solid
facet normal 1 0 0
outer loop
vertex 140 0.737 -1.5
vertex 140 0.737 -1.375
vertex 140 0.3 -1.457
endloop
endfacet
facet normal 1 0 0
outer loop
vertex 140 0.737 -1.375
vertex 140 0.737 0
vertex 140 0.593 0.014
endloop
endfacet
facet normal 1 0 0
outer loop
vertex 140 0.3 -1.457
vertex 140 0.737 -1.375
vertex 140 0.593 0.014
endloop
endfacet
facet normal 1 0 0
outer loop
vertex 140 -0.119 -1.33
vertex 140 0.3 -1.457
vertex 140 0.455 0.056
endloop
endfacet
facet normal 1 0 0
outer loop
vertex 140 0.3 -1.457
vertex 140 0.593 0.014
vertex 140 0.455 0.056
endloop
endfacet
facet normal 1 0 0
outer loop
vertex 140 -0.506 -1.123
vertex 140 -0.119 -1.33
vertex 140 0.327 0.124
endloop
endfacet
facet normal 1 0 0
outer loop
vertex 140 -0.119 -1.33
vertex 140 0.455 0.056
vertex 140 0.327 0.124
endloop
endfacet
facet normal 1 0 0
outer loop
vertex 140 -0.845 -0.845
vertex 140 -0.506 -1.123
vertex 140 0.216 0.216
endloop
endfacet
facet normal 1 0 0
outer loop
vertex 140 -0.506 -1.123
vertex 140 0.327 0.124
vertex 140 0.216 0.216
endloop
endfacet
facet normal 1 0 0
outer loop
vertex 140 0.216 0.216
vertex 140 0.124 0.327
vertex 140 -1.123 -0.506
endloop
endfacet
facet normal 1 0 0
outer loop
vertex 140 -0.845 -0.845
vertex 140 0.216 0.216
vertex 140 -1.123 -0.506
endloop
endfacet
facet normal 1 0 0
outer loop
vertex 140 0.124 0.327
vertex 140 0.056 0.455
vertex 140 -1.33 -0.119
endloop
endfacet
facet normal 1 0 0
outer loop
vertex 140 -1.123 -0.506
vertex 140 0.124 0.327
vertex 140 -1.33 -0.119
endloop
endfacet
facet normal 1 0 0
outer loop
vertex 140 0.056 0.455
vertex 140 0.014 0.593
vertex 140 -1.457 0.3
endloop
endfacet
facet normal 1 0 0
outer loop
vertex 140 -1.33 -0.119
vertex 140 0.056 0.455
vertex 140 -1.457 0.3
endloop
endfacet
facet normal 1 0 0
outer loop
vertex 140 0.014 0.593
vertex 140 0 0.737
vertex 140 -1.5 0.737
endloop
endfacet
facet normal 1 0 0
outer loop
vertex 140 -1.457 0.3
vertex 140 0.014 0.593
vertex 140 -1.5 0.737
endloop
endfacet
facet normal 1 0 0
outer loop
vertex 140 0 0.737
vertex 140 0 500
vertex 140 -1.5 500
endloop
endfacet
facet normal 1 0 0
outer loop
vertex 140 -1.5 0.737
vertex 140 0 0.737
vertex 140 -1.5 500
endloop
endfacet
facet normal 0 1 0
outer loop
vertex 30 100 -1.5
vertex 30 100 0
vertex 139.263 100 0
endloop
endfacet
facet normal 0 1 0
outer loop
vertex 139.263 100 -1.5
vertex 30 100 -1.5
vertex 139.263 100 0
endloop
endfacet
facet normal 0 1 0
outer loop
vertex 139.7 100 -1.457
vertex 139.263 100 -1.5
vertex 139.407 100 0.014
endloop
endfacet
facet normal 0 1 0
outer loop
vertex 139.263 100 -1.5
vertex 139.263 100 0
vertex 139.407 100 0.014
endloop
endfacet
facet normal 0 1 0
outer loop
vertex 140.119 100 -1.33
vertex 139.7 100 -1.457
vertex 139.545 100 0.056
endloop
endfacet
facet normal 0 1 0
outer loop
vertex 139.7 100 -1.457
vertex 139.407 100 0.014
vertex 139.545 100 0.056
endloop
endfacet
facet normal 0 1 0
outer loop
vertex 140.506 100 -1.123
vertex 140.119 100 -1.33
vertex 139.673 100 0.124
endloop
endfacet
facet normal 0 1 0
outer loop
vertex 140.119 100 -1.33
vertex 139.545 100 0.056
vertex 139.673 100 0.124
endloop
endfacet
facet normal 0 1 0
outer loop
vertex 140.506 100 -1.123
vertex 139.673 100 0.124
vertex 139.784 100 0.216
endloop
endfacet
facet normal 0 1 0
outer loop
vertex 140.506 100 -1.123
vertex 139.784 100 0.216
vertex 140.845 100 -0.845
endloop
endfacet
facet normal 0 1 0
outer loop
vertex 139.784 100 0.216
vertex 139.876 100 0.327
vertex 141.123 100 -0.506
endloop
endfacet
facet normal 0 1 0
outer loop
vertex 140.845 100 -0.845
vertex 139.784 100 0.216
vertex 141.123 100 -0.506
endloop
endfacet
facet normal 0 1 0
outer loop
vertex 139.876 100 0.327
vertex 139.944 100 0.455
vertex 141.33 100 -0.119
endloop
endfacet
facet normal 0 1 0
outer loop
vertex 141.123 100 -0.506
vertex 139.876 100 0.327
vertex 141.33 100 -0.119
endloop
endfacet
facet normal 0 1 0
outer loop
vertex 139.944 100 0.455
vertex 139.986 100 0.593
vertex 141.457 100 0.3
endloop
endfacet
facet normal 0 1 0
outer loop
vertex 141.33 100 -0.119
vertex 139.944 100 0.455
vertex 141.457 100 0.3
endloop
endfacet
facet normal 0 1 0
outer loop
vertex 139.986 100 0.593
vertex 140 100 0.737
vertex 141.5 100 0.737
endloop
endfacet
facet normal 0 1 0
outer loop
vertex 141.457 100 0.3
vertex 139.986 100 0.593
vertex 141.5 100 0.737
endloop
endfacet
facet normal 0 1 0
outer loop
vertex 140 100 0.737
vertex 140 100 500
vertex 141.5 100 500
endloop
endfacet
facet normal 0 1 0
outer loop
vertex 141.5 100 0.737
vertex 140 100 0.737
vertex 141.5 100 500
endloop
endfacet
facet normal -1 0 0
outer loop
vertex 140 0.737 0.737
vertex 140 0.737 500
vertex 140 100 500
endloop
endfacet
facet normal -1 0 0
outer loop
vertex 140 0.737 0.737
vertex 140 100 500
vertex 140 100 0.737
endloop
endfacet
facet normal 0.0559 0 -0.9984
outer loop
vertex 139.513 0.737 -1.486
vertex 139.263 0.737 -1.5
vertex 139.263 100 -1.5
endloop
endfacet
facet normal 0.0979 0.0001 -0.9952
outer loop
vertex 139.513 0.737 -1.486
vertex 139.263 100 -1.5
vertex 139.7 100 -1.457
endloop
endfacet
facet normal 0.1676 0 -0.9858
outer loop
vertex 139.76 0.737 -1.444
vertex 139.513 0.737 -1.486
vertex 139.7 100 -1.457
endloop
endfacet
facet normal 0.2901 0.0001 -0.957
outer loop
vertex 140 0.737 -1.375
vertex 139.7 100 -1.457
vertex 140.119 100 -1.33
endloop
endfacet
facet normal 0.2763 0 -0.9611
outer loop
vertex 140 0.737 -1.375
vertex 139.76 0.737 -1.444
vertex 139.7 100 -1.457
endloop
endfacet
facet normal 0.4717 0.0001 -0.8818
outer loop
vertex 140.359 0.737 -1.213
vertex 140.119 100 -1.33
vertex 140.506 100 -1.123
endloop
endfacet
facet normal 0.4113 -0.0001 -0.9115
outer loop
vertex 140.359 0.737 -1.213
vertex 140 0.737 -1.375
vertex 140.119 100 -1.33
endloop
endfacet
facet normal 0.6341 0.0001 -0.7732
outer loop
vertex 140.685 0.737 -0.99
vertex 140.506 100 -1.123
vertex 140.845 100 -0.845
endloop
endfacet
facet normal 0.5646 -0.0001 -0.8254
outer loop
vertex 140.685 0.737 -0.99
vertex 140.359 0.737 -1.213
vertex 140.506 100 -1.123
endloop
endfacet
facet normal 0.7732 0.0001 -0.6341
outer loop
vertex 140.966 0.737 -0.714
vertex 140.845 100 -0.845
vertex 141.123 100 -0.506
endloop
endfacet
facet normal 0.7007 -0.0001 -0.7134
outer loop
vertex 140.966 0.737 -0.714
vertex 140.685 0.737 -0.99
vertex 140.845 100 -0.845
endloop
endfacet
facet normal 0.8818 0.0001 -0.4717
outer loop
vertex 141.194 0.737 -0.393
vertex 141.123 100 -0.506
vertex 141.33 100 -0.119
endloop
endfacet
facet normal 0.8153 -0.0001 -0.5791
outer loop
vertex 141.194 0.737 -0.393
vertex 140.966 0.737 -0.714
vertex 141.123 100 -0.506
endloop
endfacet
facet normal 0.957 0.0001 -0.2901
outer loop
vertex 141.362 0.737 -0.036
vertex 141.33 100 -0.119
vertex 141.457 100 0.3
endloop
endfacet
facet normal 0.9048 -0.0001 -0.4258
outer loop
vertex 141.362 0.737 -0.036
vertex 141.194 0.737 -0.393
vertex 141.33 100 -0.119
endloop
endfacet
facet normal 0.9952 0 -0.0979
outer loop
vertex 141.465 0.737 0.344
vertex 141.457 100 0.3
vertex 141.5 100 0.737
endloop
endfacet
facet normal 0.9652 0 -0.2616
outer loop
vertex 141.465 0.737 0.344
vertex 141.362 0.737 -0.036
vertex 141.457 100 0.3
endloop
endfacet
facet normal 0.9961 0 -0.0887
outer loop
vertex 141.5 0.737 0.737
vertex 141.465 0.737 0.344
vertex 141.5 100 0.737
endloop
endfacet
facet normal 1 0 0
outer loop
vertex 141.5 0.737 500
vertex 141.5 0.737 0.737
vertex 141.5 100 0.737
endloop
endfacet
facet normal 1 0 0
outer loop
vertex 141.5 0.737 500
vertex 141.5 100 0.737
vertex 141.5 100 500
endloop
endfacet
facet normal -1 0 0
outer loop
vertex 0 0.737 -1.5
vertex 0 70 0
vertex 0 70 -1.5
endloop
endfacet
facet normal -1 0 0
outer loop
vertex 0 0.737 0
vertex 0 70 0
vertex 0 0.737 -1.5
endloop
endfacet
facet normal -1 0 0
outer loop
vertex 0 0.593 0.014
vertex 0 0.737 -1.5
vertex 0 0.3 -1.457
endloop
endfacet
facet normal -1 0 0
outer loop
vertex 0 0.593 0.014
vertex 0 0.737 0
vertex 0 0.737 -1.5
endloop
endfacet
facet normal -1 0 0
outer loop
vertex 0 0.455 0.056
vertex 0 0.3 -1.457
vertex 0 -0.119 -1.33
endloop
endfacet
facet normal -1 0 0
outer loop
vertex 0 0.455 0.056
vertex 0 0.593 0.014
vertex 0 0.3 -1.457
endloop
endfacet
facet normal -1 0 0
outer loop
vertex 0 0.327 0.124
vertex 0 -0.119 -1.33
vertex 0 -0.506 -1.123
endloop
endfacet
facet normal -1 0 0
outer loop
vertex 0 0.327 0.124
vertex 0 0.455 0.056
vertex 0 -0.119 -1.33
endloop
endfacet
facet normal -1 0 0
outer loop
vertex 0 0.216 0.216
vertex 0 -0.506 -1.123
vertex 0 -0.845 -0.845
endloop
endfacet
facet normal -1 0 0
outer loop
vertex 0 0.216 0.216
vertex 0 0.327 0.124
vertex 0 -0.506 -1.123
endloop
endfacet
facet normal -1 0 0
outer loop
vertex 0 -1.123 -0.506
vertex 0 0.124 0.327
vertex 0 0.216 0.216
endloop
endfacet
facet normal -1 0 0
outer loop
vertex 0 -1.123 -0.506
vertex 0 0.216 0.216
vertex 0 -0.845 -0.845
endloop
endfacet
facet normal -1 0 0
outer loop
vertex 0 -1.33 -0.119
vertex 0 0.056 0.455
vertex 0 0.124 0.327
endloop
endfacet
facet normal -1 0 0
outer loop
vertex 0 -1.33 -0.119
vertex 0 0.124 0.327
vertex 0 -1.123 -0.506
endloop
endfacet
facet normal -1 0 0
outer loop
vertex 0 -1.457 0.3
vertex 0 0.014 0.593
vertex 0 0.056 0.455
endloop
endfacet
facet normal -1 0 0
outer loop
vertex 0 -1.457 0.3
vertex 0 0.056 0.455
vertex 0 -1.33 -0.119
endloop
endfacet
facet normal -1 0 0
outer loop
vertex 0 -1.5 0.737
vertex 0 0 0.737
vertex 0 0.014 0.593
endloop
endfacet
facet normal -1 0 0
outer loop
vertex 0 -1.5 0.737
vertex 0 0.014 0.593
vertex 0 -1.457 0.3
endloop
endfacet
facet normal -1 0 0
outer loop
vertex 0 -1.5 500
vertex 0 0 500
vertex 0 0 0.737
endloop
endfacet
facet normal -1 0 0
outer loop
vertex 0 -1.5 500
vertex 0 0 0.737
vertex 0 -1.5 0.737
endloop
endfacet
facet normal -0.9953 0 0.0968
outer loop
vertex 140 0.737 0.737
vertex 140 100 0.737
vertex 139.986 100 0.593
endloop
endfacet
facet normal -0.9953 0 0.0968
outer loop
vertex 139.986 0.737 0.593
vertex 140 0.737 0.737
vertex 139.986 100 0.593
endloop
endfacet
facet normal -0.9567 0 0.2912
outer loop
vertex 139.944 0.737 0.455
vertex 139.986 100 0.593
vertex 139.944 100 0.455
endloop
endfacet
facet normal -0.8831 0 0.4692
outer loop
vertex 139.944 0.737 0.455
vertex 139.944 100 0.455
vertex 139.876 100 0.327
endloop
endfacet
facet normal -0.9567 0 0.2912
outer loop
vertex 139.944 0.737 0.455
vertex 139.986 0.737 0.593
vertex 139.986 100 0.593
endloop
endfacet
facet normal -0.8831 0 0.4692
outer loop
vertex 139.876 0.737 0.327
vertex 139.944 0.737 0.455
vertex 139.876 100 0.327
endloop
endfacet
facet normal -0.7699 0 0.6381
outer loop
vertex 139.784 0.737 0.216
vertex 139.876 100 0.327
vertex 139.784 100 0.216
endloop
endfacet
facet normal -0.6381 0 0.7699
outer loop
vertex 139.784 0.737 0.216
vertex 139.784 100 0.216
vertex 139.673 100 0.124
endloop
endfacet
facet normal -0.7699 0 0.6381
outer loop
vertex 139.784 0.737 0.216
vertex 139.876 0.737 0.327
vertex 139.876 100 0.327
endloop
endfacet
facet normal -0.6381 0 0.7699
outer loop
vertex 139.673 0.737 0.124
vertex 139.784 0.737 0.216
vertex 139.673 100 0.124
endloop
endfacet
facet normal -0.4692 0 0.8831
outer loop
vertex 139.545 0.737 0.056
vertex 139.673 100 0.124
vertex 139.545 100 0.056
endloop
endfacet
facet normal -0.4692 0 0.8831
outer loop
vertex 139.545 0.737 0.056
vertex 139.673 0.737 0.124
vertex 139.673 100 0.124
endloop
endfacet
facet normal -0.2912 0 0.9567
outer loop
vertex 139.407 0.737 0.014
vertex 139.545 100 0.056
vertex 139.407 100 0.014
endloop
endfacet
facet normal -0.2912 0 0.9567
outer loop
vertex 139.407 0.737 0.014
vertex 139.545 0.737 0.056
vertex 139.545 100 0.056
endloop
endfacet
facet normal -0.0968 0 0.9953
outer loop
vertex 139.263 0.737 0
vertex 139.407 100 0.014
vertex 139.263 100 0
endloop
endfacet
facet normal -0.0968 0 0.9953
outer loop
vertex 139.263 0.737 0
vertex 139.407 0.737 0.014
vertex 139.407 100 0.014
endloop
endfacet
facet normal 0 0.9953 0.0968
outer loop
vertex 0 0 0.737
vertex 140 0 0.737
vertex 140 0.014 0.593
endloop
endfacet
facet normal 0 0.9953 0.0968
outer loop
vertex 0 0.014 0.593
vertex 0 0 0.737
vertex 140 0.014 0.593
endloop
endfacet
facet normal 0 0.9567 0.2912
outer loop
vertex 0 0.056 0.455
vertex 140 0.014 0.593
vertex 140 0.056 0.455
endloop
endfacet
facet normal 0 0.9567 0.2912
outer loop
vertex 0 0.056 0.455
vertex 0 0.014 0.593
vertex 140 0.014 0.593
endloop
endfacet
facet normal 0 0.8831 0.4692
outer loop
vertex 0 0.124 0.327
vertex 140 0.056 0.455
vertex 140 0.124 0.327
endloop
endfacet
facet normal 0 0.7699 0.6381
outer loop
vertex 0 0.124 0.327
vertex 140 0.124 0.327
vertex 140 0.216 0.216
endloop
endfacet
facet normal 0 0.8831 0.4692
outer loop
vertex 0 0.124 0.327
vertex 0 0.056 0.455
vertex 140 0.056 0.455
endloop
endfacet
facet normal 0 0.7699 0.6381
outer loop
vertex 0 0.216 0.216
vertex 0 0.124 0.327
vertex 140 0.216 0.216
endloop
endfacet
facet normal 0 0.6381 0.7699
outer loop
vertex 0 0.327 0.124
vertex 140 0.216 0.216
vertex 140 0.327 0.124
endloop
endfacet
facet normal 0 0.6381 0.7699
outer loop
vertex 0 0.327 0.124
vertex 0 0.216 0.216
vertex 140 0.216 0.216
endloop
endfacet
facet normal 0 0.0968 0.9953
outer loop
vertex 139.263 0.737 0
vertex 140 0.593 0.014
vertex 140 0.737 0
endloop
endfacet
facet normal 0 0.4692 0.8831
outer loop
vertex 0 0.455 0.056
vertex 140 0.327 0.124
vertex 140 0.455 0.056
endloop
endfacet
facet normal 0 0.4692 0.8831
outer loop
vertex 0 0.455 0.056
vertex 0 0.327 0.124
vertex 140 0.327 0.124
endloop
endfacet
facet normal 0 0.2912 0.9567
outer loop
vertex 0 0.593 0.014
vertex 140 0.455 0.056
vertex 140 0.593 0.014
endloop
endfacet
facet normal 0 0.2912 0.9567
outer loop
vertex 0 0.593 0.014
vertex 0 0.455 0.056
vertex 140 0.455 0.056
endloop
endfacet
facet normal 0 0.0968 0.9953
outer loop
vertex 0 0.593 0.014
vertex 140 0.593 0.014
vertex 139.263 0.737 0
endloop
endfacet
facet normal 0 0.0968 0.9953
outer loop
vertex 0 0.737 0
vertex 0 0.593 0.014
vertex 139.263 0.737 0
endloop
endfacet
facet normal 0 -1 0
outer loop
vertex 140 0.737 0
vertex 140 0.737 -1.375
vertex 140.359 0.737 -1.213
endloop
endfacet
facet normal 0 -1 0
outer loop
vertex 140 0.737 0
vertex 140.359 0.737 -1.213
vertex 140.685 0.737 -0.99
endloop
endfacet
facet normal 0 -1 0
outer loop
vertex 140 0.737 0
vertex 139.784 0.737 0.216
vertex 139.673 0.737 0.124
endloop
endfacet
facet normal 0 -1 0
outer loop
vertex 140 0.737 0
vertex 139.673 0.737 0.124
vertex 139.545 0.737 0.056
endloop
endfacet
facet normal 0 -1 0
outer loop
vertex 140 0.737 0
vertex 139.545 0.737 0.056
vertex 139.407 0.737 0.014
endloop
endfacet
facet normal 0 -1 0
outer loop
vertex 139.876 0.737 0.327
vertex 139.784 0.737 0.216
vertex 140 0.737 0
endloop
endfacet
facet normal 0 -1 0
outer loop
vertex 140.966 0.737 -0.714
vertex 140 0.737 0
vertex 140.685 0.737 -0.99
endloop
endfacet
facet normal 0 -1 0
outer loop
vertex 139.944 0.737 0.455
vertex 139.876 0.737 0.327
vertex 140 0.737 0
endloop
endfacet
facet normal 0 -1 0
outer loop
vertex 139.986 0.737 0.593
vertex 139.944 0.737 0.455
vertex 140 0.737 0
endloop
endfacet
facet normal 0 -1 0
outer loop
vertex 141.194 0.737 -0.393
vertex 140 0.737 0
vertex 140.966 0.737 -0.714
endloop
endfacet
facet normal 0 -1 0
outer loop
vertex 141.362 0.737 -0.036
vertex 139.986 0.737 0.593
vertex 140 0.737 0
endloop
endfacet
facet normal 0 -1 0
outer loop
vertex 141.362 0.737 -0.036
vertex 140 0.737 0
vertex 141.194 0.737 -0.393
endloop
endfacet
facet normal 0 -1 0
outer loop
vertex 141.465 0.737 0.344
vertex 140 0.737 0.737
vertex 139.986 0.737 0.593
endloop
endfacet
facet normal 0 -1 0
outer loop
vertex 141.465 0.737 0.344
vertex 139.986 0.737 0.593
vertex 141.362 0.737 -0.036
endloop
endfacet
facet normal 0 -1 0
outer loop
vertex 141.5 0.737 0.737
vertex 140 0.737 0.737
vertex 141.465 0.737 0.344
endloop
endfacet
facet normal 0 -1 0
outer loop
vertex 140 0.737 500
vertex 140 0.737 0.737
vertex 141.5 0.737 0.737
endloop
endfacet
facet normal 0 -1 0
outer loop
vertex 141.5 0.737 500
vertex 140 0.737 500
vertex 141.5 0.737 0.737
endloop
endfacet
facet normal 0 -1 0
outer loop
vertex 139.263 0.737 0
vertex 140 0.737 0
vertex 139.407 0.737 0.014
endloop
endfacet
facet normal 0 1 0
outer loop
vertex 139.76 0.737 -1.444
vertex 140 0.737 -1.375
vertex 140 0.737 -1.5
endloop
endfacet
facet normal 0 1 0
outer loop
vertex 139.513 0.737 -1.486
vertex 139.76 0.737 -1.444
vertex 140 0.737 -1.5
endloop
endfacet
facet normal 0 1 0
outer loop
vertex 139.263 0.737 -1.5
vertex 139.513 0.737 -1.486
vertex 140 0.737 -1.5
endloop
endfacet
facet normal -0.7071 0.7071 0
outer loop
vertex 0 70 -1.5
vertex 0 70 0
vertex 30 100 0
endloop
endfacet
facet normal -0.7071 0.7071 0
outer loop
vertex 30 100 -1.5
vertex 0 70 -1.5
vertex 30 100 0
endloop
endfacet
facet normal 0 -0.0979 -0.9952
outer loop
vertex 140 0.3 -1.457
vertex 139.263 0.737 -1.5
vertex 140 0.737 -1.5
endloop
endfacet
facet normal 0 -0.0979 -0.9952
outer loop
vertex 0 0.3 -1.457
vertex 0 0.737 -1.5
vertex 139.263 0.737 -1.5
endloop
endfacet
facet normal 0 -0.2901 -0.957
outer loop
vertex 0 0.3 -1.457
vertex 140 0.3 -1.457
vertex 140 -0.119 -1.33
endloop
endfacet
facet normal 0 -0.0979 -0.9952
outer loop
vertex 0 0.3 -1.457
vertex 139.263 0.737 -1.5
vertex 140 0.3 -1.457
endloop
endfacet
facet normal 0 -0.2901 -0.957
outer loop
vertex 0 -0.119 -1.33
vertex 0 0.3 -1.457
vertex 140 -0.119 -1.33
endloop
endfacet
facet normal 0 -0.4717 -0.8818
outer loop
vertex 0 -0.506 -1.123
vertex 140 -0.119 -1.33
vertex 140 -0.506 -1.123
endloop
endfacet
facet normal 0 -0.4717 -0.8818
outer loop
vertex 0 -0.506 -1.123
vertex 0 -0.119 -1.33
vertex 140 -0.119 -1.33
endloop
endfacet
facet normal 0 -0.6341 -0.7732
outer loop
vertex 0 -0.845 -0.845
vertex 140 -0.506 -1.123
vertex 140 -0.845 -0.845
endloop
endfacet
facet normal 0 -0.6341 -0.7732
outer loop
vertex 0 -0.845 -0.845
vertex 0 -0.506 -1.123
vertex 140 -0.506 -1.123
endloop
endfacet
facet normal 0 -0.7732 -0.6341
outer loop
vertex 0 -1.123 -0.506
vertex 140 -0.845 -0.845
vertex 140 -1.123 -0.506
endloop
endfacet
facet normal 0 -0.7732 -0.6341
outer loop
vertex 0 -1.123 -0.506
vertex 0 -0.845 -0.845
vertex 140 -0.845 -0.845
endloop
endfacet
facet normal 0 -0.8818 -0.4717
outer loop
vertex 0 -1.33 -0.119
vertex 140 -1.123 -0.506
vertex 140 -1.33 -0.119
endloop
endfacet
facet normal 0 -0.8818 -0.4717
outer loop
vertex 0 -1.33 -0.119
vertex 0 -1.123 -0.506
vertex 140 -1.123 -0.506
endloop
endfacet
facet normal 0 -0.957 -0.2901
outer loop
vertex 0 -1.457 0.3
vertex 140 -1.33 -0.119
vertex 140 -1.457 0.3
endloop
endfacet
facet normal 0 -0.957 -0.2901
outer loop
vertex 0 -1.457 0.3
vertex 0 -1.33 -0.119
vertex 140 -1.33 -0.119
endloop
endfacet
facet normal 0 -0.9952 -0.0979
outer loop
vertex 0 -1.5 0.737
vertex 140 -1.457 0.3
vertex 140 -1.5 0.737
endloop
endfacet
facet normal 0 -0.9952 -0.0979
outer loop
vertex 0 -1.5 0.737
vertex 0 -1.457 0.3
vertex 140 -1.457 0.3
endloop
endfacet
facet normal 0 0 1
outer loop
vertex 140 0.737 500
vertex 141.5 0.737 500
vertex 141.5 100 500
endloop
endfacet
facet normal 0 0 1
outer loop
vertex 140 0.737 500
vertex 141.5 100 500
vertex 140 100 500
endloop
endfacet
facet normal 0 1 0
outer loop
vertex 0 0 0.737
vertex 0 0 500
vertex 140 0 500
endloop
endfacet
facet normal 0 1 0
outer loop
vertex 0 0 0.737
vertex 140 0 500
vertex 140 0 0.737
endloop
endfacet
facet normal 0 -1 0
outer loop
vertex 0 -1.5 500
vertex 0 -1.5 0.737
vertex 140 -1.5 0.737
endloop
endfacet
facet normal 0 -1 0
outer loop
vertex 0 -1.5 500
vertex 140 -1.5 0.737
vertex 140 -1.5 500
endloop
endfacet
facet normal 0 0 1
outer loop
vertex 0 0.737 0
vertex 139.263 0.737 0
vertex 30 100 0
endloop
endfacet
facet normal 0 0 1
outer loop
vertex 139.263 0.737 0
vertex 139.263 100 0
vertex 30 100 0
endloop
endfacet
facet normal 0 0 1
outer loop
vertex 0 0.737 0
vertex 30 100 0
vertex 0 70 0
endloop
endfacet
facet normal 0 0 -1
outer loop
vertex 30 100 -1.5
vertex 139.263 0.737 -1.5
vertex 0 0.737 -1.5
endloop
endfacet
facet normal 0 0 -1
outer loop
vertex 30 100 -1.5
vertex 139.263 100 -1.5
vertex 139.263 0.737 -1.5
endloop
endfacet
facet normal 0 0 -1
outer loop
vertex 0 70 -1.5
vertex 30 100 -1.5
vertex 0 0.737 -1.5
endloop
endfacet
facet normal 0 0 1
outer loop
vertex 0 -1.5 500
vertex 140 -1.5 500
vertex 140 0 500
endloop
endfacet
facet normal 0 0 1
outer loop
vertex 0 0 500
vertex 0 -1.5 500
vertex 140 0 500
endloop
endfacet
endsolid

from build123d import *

# Parameters (mm, degrees)
TABAN_FLAN_2_DEPTH           = 1.5
KENAR_FLAN_5_STRIP_W         = 7.4732
KENAR_FLAN_5_STRIP_H         = 1.5
KENAR_FLAN_5_STRIP_CUT_DEPTH = 140
KENAR_FLAN_5_DEPTH           = 140
KENAR_FLAN_6_STRIP_W         = 7.4732
KENAR_FLAN_6_STRIP_H         = 1.5
KENAR_FLAN_6_STRIP_CUT_DEPTH = 99.2634
KENAR_FLAN_6_DEPTH           = 99.2634


# Sheet-metal steps are written as plain solids
with BuildPart() as part:
    # Çizim1 → Taban-Flanş2 (new body)
    with BuildSketch(Plane.XY):
        Polygon((0, 0), (0, 70), (30, 100), (140, 100), (140, 0), align=None)
    extrude(amount=-TABAN_FLAN_2_DEPTH)

    # Kenar-Flanş5 strip (across the edge) → Kenar-Flanş5 strip cut (cut)
    with BuildSketch(Plane.YZ):
        with Locations((-3, -0.75)):
            Rectangle(KENAR_FLAN_5_STRIP_W, KENAR_FLAN_5_STRIP_H)
    extrude(amount=KENAR_FLAN_5_STRIP_CUT_DEPTH, mode=Mode.SUBTRACT)

    # Kenar-Flanş5 section (across the edge) → Kenar-Flanş5 (add)
    with BuildSketch(Plane.YZ):
        with BuildLine():
            Line((-1.5, 0.7366), (-1.5, 500))
            Line((-1.5, 500), (0, 500))
            Line((0, 500), (0, 0.7366))
            ThreePointArc((0, 0.7366), (0.215745145, 0.215745145), (0.7366, 0))
            Line((0.7366, 0), (0.7366, -1.5))
            ThreePointArc((0.7366, -1.5), (-0.844915027, -0.844915027), (-1.5, 0.7366))
        make_face()
    extrude(amount=KENAR_FLAN_5_DEPTH)

    # Kenar-Flanş6 strip (across the edge) → Kenar-Flanş6 strip cut (cut)
    with BuildSketch(Plane(origin=(140, 0.7366, 0), x_dir=(-1, 0, 0), z_dir=(0, 1, 0))):
        with Locations((-3, -0.75)):
            Rectangle(KENAR_FLAN_6_STRIP_W, KENAR_FLAN_6_STRIP_H)
    extrude(amount=KENAR_FLAN_6_STRIP_CUT_DEPTH, mode=Mode.SUBTRACT)

    # Kenar-Flanş6 section (across the edge) → Kenar-Flanş6 (add)
    with BuildSketch(Plane(origin=(140, 0.7366, 0), x_dir=(-1, 0, 0), z_dir=(0, 1, 0))):
        with BuildLine():
            Line((-1.5, 0.7366), (-1.5, 500))
            Line((-1.5, 500), (0, 500))
            Line((0, 500), (0, 0.7366))
            ThreePointArc((0, 0.7366), (0.215745145, 0.215745145), (0.7366, 0))
            Line((0.7366, 0), (0.7366, -1.5))
            ThreePointArc((0.7366, -1.5), (-0.844915027, -0.844915027), (-1.5, 0.7366))
        make_face()
    extrude(amount=KENAR_FLAN_6_DEPTH)


solid = part.part
